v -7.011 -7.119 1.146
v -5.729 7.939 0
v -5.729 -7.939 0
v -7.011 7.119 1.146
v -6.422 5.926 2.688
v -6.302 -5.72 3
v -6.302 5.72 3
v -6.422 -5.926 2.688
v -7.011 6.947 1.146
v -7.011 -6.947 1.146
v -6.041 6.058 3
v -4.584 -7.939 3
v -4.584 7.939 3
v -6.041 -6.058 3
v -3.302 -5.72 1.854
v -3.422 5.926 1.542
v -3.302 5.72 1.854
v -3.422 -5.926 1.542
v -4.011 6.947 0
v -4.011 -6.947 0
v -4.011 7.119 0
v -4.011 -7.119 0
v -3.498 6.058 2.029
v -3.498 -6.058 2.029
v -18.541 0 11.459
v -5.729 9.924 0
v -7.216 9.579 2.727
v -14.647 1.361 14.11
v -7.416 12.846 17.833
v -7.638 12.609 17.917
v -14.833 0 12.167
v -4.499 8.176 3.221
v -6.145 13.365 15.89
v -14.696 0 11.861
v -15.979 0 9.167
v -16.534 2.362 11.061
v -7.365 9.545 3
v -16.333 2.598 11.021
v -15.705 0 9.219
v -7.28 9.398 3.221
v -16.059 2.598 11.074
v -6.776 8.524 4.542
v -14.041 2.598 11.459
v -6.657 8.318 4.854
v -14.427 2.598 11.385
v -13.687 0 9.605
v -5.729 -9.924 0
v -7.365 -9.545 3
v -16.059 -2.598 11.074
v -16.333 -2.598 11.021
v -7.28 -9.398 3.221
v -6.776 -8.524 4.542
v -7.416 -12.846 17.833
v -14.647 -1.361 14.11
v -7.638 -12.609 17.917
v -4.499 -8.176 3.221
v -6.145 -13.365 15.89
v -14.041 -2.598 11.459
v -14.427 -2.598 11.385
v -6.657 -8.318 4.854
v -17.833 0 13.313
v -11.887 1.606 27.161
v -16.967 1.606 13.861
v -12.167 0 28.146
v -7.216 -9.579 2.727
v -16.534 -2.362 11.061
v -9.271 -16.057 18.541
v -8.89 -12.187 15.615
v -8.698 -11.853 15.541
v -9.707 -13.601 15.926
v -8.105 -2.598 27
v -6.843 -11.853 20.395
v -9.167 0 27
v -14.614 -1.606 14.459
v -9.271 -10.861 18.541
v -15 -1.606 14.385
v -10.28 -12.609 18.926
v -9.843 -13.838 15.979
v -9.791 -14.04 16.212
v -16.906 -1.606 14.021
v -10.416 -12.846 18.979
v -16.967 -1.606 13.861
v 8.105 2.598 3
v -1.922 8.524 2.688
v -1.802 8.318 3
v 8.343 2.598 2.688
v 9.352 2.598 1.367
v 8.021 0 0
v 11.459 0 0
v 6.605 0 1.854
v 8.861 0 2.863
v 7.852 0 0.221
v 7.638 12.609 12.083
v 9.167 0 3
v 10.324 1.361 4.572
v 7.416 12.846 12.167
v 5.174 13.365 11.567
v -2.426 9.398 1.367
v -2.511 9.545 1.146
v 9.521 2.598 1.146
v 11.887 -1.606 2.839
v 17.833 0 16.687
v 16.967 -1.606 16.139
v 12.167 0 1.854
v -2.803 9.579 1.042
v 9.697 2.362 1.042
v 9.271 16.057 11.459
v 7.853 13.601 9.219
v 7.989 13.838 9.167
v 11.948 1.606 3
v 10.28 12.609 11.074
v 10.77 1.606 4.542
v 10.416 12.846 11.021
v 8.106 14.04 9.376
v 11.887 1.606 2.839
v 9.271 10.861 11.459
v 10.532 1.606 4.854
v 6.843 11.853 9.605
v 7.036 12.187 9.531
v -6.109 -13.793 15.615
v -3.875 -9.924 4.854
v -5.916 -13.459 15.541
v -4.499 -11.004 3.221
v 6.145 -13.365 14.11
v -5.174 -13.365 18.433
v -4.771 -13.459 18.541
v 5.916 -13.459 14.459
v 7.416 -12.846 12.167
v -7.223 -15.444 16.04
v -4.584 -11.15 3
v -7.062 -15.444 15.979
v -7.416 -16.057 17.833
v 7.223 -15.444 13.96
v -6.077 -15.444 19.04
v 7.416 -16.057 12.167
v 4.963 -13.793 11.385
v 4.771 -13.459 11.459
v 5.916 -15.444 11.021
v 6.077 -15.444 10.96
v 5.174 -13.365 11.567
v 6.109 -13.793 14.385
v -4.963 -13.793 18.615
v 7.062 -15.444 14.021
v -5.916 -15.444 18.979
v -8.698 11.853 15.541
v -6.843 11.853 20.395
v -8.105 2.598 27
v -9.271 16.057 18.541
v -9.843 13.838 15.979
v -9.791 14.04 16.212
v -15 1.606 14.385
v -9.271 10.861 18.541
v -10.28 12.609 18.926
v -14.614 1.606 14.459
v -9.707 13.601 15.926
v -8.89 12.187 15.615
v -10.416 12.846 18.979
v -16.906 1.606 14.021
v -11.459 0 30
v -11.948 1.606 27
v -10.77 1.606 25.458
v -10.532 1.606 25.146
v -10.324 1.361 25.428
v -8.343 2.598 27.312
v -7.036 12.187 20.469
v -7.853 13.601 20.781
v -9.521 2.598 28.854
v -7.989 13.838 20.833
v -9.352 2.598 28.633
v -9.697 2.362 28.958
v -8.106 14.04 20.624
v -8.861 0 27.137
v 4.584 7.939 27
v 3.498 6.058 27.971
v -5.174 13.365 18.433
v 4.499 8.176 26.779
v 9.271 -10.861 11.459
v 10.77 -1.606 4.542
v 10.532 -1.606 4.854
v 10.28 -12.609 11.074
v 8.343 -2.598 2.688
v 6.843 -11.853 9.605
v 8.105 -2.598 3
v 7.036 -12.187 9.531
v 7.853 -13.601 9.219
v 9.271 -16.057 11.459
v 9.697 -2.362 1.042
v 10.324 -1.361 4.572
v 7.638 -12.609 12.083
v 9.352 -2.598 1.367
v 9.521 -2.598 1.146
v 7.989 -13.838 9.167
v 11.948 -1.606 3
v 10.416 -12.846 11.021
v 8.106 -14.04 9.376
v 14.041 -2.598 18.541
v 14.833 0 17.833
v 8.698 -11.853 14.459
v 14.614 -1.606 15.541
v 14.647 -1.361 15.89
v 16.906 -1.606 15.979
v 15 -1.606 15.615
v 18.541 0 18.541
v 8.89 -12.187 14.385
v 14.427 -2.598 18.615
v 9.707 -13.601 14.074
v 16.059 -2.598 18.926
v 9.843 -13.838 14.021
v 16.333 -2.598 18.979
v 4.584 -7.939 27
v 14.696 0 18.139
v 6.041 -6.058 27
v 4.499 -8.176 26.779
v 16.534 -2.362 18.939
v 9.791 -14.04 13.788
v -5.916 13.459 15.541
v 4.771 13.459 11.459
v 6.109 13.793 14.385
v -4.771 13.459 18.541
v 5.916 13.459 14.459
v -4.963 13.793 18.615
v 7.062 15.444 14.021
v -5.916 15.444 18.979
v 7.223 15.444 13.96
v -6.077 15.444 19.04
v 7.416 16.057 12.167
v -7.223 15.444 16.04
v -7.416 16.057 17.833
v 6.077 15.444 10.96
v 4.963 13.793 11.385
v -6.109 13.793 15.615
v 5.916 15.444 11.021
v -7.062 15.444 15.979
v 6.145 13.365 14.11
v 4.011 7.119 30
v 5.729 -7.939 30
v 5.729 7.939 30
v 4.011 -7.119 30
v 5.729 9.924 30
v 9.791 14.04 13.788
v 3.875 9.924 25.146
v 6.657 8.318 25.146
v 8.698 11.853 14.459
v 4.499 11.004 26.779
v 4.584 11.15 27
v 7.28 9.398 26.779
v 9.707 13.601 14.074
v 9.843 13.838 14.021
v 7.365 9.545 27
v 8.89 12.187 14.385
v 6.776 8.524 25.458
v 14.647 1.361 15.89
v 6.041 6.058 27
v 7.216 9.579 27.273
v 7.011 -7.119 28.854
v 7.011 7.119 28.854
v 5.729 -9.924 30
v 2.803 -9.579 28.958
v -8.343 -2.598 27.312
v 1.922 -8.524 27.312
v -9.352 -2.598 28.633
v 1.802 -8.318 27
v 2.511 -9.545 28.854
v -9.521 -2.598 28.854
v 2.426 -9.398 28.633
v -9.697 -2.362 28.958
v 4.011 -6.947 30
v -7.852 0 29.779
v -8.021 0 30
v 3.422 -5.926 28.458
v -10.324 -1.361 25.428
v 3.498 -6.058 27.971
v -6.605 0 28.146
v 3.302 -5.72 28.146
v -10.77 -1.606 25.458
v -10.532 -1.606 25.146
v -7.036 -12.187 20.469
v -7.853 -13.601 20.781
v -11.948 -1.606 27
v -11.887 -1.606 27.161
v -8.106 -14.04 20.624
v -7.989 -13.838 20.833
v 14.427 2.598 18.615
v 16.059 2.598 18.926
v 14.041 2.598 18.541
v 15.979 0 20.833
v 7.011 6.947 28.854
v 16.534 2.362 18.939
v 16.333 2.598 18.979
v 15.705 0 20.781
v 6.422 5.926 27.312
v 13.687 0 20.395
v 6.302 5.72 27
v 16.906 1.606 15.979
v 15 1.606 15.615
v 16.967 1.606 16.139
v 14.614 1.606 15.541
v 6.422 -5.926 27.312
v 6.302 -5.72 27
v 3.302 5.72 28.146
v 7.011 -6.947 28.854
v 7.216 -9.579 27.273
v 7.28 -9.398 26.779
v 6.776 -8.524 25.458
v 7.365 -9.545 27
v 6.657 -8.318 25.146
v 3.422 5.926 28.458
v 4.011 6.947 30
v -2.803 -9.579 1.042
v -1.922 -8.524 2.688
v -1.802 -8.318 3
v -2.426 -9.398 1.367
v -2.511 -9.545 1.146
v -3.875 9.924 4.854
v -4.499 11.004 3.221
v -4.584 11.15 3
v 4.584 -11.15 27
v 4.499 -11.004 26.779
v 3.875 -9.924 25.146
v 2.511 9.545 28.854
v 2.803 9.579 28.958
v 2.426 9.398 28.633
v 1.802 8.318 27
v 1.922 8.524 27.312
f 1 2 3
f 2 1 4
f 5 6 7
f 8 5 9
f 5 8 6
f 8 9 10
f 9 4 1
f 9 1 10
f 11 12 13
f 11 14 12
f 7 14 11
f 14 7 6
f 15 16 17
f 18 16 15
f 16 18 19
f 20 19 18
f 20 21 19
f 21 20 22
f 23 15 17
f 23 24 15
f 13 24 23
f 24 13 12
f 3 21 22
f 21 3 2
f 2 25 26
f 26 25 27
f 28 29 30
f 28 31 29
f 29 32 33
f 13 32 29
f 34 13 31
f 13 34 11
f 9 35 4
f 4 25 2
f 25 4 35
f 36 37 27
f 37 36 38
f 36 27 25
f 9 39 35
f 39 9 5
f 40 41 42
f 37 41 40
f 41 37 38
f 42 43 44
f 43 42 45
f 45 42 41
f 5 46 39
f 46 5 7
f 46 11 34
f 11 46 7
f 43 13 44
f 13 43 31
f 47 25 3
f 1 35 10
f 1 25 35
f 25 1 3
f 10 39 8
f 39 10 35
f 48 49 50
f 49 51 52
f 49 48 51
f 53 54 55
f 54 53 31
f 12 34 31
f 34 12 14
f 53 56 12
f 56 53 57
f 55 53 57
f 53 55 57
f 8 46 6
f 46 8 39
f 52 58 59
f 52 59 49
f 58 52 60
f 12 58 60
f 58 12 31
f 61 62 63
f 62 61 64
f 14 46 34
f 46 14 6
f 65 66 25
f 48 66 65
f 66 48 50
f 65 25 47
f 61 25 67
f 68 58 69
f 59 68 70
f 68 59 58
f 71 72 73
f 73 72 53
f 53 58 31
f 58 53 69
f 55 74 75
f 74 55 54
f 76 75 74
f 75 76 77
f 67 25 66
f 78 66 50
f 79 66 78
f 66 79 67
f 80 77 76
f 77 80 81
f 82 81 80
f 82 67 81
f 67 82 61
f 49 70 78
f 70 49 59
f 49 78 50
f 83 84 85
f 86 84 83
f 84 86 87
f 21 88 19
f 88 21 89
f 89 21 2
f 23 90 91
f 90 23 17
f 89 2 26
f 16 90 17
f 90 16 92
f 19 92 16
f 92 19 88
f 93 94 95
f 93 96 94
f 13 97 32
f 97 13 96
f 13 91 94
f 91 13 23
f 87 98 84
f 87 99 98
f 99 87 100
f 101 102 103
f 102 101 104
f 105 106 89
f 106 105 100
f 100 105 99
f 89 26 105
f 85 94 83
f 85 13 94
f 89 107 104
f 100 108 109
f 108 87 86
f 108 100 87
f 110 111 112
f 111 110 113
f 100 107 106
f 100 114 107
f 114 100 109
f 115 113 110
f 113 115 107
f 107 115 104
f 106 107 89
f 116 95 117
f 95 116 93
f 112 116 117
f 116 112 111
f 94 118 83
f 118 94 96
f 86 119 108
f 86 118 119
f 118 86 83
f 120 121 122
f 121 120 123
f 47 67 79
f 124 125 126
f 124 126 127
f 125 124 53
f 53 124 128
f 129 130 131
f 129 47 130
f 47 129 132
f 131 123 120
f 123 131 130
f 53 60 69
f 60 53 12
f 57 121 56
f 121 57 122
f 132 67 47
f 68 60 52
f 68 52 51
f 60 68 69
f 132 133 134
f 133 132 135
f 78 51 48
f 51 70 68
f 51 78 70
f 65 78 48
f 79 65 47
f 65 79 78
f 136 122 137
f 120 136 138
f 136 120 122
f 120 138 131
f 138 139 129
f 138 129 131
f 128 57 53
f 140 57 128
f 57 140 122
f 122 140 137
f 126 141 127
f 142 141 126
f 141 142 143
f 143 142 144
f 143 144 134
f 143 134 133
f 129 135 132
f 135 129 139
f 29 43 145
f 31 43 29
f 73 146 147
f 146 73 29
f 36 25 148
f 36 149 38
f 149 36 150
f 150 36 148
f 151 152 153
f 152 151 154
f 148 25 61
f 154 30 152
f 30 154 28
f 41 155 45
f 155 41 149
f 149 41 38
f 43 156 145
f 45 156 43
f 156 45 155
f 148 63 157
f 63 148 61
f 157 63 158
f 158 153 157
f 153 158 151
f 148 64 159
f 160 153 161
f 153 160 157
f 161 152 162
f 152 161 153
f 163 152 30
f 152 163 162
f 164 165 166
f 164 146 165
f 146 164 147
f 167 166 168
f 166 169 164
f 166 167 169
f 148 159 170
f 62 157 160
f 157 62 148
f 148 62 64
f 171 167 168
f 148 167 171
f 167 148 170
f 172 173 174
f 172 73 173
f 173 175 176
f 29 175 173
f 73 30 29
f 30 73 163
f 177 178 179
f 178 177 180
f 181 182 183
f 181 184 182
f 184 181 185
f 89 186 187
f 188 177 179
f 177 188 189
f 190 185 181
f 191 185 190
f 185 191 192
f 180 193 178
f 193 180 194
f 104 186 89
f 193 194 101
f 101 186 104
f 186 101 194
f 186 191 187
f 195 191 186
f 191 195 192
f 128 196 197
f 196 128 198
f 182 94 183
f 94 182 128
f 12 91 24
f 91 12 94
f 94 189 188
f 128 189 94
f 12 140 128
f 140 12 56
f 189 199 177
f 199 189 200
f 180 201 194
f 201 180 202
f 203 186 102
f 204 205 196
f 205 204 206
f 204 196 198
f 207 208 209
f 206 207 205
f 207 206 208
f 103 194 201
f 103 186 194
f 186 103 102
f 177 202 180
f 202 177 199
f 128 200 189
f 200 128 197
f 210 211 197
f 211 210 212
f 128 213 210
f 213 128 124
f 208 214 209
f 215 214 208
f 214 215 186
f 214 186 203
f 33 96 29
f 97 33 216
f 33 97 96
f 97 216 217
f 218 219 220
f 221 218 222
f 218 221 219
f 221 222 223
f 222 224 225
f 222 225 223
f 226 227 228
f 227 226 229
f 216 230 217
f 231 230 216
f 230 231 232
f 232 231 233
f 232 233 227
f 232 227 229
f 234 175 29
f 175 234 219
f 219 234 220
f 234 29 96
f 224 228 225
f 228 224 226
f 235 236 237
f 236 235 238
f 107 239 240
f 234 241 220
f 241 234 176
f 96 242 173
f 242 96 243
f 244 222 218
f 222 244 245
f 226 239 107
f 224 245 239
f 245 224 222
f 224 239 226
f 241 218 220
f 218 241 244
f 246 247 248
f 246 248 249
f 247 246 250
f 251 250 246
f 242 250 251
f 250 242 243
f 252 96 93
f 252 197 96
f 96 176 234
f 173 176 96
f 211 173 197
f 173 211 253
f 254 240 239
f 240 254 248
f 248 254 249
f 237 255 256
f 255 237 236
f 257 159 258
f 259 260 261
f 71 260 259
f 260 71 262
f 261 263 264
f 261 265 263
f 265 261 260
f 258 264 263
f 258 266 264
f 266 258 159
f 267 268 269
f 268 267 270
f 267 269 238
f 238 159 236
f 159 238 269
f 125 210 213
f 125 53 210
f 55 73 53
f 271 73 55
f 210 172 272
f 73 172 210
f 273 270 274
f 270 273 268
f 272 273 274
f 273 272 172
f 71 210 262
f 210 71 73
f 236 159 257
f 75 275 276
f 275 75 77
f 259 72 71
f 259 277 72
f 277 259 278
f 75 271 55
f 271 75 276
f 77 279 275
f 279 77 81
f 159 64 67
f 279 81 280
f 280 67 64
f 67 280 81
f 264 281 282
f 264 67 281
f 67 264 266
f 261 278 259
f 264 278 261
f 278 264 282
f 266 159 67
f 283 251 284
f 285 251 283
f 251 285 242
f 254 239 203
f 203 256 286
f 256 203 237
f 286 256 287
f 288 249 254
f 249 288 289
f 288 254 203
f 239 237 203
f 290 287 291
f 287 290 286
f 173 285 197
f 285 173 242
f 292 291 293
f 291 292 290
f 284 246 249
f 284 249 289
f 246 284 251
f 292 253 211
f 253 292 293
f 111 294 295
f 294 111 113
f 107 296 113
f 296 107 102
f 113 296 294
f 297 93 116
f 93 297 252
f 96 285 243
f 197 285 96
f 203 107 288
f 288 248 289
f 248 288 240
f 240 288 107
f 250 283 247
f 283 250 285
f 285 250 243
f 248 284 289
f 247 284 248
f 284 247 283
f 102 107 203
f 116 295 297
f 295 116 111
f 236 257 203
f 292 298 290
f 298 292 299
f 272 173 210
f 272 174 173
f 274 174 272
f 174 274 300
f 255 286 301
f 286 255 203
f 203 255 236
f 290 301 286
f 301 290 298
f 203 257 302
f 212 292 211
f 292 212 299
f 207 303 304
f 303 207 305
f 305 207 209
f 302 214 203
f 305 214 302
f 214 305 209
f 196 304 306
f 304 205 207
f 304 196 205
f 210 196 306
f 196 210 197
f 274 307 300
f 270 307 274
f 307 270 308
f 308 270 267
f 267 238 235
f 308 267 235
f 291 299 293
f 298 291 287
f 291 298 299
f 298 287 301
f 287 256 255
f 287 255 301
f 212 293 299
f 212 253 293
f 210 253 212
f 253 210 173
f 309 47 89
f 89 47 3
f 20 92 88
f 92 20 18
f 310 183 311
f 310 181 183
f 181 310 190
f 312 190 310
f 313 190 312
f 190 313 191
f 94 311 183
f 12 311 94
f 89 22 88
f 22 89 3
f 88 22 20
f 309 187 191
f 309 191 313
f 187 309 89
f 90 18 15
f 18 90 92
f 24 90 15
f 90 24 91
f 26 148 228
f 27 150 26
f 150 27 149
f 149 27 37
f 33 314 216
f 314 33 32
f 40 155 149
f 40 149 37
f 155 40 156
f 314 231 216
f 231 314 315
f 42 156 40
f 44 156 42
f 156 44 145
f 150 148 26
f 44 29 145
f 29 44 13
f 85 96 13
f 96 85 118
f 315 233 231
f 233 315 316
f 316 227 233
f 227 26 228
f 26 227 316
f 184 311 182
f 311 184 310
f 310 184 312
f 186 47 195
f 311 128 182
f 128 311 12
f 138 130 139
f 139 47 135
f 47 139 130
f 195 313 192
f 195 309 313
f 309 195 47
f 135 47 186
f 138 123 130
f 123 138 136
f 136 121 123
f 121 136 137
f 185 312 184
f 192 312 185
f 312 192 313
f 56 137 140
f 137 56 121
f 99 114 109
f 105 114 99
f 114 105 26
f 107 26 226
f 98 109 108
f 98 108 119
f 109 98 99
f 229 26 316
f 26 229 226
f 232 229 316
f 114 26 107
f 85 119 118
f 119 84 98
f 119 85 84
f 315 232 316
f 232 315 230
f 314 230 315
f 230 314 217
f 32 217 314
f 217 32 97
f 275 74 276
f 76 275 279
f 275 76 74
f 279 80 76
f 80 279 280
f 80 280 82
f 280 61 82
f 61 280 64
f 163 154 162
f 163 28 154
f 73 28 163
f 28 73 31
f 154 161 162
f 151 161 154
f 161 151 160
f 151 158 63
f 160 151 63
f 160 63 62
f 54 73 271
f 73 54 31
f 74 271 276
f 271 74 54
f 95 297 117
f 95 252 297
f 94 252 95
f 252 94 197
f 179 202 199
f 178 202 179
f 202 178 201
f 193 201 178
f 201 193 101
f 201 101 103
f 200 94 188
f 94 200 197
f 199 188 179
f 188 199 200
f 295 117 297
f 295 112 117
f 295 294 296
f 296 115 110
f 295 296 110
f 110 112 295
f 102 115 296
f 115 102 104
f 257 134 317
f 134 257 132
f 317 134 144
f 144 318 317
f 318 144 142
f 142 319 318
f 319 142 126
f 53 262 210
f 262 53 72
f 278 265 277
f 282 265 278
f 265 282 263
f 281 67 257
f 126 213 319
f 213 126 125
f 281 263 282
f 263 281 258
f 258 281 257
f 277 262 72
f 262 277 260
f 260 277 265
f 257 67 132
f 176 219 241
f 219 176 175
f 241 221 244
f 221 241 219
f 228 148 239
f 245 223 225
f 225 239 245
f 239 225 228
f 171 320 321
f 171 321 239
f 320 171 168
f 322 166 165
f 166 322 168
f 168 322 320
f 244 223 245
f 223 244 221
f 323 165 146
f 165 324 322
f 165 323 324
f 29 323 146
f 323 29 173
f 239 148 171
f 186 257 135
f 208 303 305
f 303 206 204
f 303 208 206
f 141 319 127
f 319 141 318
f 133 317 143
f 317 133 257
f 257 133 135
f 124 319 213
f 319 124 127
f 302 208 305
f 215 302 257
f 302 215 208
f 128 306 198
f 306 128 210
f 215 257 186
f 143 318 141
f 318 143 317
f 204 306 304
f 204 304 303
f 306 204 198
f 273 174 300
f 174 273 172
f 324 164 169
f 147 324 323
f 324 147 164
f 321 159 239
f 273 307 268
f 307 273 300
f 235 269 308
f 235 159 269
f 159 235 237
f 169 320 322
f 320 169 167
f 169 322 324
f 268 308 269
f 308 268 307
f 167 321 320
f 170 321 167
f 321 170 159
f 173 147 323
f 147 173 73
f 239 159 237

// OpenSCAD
// shape height
sh = 30;
// border width
bw = 3;


translate([0, 0, sh / 2]) 
    iface_rotate() 
        icosahedron1();



// ------------ icosahedron ------------

phi = (sqrt(5) + 1) / 2;

// icosahedron vertices
ivert = [
    [0, -1, -phi], // 0
    [0, 1, -phi], // 1
    [-phi, 0, -1], // 2
    [phi, 0, -1], // 3
    [-1, -phi, 0], // 4
    [-1, phi, 0], // 5
    [1, -phi, 0], // 6
    [1, phi, 0], // 7
    [-phi, 0, 1], // 8
    [phi, 0, 1], // 9
    [0, -1, phi], // 10
    [0, 1, phi] // 11    
];

iface = [
    [0, 1, 2],
    [1, 0, 3],
    [0, 2, 4],
    [2, 1, 5],
    [1, 3, 7],
    [3, 0, 6],
    [1, 7, 5],
    [0, 4, 6],
    [2, 8, 4],
    [2, 5, 8],
    [3, 6, 9],
    [3, 9, 7],
    [4, 10, 6],
    [5, 7, 11],
    [8, 10, 4],
    [5, 11, 8],
    [9, 11, 7],
    [6, 10, 9],
    [8, 11, 10],
    [9, 10, 11]
];

if0c = (ivert[0] + ivert[1] + ivert[2]) / 3;
ifr = norm(if0c);
ifa = atan(if0c.x / if0c.z);


    

module iface_rotate() { 
    rotate([0, ifa, 0]) children();
}

module icosahedron0() {
    scale(bw / 2 / ifr) polyhedron(ivert, iface);    
}

module icosahedron1() {
    s = (sh - bw) / 2 / ifr;
    for (f = iface) {
        for (i = [0:2]) {
            j = (i + 1) % 3;
            p = f[i];
            q = f[j];
            if (p < q) {
                hull() {
                    translate(ivert[p] * s) icosahedron0();
                    translate(ivert[q] * s) icosahedron0();
                }                
            }
        }
    }        
}
